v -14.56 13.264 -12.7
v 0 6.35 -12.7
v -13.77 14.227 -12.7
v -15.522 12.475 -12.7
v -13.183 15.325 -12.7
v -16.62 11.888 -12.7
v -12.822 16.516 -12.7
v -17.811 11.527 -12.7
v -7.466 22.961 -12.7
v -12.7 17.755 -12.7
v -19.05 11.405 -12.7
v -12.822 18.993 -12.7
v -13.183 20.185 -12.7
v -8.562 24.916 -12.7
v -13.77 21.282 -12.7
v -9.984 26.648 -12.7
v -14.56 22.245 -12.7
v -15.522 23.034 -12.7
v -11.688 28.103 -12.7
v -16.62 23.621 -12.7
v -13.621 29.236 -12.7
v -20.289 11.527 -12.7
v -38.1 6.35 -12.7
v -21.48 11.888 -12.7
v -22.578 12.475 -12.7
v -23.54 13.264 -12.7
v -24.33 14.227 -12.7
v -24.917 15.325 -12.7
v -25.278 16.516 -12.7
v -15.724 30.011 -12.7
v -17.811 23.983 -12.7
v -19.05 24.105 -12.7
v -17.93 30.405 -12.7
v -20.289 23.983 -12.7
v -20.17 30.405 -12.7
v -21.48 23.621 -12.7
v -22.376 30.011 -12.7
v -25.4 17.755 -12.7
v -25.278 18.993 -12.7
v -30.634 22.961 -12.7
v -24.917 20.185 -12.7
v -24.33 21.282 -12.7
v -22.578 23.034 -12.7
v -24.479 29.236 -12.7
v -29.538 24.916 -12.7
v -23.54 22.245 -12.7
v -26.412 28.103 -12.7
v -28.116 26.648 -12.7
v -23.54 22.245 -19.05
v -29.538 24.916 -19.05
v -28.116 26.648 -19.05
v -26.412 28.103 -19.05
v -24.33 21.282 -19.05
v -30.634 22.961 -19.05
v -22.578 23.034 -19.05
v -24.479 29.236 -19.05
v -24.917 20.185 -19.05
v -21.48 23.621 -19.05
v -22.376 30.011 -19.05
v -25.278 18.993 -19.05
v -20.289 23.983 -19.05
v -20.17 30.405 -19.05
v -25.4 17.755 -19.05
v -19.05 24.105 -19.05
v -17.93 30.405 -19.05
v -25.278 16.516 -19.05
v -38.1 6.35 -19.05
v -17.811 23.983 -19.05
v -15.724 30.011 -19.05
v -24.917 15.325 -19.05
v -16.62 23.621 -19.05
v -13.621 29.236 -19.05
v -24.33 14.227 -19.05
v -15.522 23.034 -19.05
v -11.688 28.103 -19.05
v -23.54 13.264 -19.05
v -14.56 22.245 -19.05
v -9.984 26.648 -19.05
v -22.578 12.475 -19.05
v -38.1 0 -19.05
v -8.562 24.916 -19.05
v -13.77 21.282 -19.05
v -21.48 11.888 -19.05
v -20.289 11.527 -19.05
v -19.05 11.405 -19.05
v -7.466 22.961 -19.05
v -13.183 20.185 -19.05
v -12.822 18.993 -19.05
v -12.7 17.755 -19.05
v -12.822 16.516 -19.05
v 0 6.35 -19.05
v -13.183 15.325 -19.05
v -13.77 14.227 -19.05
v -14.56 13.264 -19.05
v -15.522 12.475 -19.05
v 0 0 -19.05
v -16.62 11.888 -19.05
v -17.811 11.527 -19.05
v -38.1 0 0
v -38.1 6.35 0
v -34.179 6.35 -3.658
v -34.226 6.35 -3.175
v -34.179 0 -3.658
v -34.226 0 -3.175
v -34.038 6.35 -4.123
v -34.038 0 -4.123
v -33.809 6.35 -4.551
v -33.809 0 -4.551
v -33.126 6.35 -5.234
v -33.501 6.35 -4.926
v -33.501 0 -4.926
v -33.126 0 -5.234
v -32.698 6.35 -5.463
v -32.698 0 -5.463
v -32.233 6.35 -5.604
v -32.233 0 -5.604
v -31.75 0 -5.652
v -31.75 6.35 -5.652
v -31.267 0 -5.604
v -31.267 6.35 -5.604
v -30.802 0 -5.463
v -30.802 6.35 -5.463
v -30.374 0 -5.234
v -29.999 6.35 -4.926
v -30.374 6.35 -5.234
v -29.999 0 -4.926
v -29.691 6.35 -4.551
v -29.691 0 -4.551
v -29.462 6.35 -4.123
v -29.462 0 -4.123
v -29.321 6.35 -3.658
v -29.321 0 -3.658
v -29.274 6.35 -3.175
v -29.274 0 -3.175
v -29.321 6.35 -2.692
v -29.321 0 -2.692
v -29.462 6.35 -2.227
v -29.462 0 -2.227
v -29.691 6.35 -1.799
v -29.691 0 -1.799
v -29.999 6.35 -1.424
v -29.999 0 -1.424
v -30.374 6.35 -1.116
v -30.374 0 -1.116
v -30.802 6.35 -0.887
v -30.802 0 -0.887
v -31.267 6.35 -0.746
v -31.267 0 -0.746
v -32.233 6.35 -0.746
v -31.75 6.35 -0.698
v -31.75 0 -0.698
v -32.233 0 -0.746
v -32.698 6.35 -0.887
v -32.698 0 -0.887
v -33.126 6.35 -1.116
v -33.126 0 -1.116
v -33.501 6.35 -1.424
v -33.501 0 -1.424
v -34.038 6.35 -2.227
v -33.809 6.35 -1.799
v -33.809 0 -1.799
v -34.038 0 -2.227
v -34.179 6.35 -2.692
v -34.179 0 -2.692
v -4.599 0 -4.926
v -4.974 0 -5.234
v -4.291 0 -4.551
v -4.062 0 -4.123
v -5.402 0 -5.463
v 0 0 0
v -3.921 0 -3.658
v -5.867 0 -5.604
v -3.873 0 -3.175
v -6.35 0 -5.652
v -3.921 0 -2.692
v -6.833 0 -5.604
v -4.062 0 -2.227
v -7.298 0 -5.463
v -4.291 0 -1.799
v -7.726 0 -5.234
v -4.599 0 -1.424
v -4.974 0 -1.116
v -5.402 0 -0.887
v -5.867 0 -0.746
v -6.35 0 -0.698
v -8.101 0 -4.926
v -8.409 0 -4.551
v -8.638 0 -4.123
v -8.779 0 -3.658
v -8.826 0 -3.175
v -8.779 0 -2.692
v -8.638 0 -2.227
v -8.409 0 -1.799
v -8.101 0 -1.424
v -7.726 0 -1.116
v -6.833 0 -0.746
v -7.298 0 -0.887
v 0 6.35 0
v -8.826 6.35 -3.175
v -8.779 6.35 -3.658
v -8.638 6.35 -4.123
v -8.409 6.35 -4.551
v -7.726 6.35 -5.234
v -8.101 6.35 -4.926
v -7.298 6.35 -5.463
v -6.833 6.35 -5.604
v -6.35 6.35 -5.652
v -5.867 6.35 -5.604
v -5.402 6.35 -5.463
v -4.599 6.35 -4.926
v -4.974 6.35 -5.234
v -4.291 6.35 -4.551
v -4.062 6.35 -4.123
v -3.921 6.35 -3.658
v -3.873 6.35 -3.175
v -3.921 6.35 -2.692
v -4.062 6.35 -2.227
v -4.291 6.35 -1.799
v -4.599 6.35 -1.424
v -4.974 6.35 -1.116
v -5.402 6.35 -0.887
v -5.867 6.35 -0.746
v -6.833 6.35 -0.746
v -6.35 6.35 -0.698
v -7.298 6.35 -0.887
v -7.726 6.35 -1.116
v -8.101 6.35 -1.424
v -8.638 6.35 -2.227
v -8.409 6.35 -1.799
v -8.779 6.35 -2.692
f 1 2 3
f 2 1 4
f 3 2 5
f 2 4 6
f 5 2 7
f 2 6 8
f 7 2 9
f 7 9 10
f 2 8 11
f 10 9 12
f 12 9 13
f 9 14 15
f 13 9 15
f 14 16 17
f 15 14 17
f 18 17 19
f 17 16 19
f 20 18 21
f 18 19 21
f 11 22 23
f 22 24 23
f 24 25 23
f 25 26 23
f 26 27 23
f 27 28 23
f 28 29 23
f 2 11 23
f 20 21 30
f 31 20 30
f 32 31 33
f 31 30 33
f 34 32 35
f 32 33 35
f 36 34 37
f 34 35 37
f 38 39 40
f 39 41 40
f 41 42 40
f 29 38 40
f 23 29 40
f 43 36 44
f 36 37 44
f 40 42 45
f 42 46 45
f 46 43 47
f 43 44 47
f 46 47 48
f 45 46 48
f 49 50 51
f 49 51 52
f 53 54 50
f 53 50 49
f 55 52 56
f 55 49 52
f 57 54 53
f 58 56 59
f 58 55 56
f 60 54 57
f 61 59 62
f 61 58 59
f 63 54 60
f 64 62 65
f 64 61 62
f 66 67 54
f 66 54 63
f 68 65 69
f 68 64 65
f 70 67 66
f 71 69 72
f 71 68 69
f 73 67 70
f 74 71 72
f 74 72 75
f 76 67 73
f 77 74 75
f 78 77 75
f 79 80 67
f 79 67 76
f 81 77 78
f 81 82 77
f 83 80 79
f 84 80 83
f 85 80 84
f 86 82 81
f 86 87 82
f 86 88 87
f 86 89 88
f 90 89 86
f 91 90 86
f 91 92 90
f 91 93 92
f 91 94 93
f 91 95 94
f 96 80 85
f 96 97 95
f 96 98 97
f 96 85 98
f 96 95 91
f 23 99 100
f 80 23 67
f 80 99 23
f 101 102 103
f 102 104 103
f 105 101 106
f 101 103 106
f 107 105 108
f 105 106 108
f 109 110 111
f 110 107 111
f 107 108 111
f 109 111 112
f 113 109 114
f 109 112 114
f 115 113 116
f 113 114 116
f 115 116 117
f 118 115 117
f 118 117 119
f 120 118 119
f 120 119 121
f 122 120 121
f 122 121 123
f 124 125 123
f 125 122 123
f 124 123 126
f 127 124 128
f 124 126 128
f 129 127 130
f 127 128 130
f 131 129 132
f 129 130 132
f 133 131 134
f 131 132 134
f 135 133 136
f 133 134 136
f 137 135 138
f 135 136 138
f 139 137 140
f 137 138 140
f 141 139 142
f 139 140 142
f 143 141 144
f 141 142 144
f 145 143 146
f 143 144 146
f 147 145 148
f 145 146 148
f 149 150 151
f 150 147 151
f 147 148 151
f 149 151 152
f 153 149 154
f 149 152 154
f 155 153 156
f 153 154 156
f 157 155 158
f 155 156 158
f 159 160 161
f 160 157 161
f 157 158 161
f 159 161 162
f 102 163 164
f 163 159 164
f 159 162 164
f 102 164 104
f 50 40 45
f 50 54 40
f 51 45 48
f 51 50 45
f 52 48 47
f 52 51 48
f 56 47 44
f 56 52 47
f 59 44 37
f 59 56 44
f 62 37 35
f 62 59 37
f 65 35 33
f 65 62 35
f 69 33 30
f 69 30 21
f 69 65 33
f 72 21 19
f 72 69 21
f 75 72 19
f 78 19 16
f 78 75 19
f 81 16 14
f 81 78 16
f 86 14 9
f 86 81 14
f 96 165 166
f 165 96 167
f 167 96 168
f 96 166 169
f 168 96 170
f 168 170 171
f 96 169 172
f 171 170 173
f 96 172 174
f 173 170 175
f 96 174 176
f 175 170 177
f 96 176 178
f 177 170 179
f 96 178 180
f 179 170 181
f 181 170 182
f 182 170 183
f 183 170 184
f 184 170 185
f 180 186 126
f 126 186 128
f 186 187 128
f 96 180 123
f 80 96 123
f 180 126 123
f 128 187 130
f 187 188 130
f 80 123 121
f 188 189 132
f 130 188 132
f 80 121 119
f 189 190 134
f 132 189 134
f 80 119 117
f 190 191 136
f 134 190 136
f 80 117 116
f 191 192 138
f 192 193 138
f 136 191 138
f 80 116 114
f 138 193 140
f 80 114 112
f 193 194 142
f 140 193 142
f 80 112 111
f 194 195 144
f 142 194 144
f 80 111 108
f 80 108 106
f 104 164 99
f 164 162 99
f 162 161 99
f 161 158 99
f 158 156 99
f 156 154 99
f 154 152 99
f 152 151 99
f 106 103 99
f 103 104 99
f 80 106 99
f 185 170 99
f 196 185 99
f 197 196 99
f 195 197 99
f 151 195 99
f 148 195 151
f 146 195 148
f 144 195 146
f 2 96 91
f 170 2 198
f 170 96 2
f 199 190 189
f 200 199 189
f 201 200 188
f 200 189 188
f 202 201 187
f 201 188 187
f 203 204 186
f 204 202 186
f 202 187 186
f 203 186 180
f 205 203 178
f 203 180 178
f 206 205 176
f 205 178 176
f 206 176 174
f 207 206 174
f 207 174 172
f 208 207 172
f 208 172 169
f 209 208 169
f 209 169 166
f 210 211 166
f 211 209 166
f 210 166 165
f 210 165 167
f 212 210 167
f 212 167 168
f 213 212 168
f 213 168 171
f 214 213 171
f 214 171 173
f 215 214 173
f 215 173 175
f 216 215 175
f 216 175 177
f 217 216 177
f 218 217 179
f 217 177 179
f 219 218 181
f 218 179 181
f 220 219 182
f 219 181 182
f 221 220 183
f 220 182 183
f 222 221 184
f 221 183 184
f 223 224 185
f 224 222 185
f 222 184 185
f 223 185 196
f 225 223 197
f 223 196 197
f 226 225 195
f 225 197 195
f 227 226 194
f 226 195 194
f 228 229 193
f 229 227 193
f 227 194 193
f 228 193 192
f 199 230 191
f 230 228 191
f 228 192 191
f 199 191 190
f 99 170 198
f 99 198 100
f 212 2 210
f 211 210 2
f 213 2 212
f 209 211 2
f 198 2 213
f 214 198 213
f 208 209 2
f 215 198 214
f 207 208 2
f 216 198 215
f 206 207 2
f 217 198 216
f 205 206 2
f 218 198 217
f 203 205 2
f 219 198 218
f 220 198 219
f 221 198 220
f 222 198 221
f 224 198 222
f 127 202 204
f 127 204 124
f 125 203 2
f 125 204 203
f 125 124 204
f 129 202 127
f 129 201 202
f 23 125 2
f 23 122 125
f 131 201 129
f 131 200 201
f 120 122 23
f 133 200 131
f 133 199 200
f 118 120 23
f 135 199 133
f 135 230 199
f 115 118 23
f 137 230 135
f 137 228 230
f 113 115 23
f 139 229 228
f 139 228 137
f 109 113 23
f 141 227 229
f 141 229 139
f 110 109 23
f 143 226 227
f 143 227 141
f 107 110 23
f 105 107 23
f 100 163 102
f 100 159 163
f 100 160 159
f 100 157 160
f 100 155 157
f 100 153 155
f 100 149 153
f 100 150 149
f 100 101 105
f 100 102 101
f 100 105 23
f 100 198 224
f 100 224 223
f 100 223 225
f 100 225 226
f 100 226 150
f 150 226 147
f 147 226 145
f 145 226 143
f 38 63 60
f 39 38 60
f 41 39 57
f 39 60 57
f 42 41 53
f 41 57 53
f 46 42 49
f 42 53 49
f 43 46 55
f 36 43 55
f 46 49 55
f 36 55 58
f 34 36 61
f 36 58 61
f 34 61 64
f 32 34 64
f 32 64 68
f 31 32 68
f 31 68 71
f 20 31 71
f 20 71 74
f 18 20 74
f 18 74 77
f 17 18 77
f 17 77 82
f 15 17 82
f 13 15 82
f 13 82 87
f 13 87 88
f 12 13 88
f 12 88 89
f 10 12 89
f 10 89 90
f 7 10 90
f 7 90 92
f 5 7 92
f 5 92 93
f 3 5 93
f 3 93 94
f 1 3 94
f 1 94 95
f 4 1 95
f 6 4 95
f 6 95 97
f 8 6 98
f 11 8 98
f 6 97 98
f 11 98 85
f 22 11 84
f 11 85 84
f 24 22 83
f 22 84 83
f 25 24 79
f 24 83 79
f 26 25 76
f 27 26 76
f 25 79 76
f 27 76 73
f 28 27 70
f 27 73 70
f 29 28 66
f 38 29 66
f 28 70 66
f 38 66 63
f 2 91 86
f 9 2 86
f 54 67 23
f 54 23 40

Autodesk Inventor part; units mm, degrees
ref_plane "YZ Plane" through (0, 0, 0) normal (1, 0, 0) x (0, 1, 0)
ref_plane "XZ Plane" through (0, 0, 0) normal (0, 1, 0) x (-1, 0, 0)
ref_plane "XY Plane" through (0, 0, 0) normal (0, 0, 1) x (1, 0, 0)
sketch "Sketch1" plane through (0, 0, 0) normal (0, 1, 0) x (-1, 0, 0)
  line L0 (0, 0) -> (38.1, 0)
  line L1 (38.1, 0) -> (38.1, -19.05)
  line L2 (38.1, -19.05) -> (0, -19.05)
  line L3 (0, -19.05) -> (0, 0)
  circle A0 centre (6.35, -3.175) radius 2.4765
  circle A1 centre (31.75, -3.175) radius 2.4765
  dimension "d0" = 4.953
  dimension "d1" = 4.953
  dimension "d2" = 25.4
  dimension "d3" = 6.35
  dimension "d4" = 3.175
  dimension "d5" = 6.35
  dimension "d6" = 19.05
extrude "Extrusion1" add sketch "Sketch1" along normal blind 6.35
sketch "Sketch2" plane through (0, 0, -19.05) normal (0, 0, -1) x (-1, 0, 0)
  line L0 (38.1, 0) -> (0, 0) projected
  line L1 (38.1, 0) -> (38.1, 6.35) projected
  line L2 (0, 6.35) -> (38.1, 6.35) projected
  line L3 (0, 0) -> (0, 6.35) projected
  circle A0 centre (19.05, 17.7546) radius 14.2748 projected
  circle A1 centre (19.05, 17.7546) radius 6.35
  line L4 (38.1, 6.35) -> (0, 6.35) projected
  line L5 (0, 6.35) -> (7.4663, 22.9612)
  line L6 (38.1, 6.35) -> (30.6337, 22.9612)
  arc A2 (30.6337, 22.9612) -> (7.4663, 22.9612) centre (19.05, 17.7546) ccw
  point P0 (0, 0)
  dimension "d9" = 6.35
  dimension "d10" = 12.7
extrude "Extrusion2" add sketch "Sketch2" against normal blind 6.35 contours L2 A0 L6 | L5 A0 L2 | L2 A0 L5 A2 L6
equation "\"d5\" = d3"
properties part number "Encoder mount"
